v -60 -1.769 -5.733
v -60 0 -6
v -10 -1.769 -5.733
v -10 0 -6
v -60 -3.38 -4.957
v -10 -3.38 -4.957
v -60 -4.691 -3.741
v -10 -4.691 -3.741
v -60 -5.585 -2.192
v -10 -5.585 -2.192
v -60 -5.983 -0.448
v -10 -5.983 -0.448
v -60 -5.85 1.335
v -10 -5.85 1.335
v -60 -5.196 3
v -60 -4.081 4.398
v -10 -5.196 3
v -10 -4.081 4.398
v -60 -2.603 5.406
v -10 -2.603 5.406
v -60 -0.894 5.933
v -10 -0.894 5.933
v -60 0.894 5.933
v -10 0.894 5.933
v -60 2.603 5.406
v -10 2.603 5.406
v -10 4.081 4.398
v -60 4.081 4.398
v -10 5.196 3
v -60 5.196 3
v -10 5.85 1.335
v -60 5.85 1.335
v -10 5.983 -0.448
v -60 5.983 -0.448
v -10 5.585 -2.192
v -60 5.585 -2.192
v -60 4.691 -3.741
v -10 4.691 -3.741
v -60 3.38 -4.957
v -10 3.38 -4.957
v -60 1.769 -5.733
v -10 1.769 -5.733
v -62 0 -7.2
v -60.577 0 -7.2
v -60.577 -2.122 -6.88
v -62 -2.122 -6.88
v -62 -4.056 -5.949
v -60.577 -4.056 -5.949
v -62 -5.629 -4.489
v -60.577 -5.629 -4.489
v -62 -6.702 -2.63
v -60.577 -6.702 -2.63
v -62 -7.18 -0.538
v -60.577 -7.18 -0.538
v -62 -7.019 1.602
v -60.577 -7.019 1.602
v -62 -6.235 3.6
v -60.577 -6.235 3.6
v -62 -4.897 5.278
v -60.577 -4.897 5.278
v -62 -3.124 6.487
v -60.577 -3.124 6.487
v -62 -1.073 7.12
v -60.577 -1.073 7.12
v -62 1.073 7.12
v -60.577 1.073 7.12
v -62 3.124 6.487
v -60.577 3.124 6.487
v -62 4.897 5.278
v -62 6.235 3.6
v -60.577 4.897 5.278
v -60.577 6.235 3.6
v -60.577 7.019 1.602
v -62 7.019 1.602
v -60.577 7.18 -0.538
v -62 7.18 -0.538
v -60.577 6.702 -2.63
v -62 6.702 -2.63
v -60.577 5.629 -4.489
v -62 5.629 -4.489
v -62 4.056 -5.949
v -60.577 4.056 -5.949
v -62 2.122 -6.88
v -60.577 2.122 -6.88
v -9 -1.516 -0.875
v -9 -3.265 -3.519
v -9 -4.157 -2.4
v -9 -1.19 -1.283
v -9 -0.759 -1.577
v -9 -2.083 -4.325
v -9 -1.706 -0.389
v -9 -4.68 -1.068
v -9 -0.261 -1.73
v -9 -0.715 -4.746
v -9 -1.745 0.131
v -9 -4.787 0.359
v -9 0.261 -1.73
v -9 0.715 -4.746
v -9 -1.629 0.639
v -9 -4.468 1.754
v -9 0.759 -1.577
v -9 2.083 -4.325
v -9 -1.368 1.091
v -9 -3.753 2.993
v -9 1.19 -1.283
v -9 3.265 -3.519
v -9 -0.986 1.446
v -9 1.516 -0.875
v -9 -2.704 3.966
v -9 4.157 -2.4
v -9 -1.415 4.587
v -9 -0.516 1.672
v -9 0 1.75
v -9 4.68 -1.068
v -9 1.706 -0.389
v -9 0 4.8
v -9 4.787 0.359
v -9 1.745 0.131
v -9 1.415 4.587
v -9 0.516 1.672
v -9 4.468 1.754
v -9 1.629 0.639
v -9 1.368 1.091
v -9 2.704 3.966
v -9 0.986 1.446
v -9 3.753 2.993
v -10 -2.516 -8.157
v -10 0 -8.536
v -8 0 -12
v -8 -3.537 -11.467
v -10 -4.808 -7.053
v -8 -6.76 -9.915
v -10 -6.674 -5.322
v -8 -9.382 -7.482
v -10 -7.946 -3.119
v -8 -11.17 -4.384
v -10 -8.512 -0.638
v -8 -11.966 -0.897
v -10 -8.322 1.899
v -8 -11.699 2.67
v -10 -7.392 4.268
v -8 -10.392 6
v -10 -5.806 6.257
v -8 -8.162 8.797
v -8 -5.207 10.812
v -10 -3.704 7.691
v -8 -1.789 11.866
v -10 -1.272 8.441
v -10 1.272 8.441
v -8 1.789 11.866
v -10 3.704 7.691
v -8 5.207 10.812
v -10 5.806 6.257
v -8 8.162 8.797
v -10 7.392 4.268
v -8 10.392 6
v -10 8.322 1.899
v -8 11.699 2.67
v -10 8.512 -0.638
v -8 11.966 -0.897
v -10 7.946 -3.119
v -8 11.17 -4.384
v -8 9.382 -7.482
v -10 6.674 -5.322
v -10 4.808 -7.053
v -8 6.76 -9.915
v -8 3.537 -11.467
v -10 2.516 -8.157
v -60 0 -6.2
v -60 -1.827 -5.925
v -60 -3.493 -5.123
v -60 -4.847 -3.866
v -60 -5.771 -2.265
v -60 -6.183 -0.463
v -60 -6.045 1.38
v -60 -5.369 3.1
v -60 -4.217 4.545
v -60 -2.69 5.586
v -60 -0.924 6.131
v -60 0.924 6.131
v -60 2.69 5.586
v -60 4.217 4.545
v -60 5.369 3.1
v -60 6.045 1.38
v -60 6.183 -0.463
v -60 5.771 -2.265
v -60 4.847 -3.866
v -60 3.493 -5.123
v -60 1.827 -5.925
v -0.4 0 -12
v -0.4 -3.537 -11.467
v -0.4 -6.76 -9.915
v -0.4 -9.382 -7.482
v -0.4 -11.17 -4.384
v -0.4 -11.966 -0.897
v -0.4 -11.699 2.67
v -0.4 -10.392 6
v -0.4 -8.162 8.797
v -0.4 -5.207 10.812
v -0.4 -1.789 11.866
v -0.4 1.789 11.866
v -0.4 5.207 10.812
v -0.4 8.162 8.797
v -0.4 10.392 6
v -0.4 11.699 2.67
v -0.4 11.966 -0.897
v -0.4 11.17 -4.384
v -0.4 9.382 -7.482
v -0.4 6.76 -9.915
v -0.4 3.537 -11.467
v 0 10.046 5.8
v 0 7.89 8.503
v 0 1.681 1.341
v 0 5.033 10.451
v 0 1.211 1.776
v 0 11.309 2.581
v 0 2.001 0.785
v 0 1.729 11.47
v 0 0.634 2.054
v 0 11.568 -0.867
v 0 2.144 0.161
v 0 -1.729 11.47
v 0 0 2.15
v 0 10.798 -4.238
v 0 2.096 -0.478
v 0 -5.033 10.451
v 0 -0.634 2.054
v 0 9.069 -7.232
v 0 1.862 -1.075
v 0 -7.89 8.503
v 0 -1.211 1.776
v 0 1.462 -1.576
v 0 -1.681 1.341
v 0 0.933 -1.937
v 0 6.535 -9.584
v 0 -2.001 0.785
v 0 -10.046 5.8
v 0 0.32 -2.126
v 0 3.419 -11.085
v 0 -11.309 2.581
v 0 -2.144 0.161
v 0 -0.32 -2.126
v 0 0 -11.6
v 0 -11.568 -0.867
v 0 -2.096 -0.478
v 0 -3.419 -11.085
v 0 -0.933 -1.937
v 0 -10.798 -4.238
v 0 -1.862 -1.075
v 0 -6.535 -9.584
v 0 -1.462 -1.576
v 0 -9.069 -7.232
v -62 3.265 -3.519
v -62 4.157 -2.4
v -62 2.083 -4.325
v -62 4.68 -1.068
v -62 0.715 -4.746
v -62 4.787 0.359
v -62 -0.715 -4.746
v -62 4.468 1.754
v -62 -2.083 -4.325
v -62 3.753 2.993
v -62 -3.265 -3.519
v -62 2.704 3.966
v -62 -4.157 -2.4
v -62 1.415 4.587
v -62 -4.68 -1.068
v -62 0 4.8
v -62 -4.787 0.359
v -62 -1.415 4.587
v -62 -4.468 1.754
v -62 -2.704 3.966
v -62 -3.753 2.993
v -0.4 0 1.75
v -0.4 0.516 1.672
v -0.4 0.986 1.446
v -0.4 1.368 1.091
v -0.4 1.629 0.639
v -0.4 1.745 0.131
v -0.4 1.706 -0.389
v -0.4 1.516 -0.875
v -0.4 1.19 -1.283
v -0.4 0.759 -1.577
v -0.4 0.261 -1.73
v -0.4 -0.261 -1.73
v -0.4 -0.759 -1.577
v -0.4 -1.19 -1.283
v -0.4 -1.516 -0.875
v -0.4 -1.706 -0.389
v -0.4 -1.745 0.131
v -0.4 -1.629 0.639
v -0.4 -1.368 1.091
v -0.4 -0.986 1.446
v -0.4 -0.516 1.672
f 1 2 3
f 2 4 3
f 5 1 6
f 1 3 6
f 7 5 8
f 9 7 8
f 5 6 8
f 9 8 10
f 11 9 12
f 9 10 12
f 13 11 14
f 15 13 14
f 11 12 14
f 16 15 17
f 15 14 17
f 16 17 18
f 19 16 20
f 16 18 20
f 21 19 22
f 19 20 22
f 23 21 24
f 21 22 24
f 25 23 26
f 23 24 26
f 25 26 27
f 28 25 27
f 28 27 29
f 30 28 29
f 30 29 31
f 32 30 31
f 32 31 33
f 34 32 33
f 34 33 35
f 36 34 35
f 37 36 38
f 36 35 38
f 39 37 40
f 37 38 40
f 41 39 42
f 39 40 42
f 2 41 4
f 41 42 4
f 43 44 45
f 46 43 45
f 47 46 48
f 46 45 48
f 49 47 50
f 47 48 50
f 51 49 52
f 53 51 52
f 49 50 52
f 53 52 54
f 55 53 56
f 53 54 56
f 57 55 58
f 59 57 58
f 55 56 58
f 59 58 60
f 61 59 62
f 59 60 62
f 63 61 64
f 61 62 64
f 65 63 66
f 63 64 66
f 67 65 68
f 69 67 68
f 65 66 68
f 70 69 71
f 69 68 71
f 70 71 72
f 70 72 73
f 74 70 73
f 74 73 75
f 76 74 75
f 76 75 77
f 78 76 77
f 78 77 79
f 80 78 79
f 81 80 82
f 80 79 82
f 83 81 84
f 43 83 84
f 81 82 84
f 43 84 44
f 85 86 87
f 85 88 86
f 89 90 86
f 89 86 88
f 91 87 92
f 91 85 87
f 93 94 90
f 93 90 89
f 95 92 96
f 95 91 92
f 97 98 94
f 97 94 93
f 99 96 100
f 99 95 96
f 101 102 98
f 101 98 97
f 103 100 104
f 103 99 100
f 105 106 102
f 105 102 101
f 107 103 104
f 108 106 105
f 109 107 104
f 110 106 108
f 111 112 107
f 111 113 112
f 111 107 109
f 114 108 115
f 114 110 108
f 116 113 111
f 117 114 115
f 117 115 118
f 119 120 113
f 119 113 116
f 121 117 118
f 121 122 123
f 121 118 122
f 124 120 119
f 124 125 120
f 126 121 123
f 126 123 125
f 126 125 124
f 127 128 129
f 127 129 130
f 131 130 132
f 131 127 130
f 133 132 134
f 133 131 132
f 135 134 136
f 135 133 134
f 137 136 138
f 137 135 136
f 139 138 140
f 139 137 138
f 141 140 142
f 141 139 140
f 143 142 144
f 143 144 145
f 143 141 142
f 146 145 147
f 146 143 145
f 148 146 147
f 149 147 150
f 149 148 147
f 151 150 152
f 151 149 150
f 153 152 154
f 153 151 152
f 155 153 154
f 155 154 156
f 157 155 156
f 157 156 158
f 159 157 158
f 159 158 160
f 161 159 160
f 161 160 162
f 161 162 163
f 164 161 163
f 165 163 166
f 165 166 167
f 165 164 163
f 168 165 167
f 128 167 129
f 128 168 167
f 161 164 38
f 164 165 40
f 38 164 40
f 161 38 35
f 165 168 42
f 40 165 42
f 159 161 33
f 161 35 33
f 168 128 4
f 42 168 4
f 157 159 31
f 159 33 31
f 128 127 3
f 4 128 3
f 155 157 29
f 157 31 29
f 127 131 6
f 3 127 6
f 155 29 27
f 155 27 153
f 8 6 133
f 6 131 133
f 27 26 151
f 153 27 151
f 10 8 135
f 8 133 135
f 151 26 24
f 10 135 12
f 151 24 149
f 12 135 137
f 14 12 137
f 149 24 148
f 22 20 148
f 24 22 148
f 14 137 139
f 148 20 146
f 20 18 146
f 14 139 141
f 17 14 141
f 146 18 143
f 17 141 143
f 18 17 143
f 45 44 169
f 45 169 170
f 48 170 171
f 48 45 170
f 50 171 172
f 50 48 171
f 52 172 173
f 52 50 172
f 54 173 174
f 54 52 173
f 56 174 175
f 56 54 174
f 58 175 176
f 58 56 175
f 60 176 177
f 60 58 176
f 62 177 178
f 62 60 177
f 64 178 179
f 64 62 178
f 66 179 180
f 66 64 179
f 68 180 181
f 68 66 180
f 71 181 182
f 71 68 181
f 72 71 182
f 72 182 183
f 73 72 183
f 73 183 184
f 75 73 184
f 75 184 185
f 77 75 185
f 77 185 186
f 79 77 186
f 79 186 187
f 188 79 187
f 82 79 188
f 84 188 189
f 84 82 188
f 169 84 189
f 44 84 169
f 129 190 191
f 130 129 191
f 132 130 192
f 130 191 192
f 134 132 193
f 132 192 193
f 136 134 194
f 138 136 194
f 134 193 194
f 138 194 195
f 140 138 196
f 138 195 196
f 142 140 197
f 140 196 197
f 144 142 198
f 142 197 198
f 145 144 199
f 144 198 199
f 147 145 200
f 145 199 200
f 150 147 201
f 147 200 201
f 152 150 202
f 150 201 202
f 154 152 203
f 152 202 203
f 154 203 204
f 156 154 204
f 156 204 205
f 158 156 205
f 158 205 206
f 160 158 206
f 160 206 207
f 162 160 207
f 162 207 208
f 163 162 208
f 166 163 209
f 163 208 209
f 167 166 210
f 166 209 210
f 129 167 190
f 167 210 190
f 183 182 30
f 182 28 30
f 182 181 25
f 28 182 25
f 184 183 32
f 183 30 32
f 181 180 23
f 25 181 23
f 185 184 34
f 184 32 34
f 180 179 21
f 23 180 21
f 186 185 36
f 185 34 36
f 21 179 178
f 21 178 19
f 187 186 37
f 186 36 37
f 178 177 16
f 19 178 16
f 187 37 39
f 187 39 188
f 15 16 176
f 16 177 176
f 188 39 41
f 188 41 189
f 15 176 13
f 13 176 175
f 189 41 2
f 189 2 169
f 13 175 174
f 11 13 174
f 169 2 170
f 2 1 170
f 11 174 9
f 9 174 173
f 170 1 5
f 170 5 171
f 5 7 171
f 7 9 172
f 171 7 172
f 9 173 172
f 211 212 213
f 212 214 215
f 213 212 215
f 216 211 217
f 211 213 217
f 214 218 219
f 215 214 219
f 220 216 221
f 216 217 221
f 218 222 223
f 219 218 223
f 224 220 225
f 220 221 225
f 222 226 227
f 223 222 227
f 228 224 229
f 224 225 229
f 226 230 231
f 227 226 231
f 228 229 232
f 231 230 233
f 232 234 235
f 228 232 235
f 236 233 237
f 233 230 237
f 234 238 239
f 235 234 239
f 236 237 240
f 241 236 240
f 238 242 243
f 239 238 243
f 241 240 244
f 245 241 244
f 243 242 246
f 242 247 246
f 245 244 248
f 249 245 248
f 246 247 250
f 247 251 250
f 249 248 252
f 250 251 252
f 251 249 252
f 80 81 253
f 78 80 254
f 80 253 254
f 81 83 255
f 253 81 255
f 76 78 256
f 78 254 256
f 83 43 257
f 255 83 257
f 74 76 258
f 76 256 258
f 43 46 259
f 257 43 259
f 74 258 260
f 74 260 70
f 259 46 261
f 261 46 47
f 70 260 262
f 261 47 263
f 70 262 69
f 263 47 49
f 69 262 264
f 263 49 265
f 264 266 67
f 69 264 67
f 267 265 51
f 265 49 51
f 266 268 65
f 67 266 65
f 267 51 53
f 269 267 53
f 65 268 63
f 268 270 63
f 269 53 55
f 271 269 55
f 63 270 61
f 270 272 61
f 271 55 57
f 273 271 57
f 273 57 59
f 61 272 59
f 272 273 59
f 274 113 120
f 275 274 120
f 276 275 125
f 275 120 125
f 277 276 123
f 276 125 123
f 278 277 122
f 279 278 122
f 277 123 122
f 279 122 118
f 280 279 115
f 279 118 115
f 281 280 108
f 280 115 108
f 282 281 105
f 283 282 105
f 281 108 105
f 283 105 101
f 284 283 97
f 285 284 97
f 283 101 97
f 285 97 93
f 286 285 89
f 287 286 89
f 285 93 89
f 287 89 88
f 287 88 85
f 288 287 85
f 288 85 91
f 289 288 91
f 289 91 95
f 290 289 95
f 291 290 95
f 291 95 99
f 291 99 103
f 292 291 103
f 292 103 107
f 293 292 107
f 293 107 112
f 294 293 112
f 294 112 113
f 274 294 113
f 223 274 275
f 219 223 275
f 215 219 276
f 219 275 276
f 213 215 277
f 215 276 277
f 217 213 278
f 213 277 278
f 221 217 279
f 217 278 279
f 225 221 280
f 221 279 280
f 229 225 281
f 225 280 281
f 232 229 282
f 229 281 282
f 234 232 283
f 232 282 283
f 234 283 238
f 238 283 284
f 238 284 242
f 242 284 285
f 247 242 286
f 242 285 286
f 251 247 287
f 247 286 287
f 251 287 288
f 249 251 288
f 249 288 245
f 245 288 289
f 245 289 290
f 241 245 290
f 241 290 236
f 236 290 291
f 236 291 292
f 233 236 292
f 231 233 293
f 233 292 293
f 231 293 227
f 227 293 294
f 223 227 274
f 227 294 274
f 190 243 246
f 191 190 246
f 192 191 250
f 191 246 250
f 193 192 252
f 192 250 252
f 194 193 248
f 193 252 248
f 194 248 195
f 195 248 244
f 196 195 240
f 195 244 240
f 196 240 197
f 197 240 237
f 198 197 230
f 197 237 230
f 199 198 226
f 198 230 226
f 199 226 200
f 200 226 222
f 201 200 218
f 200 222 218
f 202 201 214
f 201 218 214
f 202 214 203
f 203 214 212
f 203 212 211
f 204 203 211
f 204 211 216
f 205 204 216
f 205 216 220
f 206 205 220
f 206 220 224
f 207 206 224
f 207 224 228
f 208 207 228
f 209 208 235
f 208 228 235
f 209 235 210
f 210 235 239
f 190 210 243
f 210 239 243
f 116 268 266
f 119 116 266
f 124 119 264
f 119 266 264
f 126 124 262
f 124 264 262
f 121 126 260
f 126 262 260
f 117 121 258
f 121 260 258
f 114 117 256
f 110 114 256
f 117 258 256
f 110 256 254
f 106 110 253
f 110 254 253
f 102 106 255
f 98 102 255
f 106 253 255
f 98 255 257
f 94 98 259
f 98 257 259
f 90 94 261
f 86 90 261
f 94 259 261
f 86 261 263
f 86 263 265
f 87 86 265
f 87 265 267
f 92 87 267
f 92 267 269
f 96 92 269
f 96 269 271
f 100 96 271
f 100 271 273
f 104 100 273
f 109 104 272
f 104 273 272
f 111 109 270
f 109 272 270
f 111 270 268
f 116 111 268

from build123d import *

# Parameters (mm, degrees)
CHAMFER1_SIZE      = 1
CHAMFER1_SIZE2     = 0.577350269
CHAMFER2_SIZE      = 2
CHAMFER2_SIZE2     = 3.464101615
SKETCH4_R          = 4.8
CUT_EXTRUDE1_DEPTH = 53
SKETCH5_R          = 1.75
CUT_EXTRUDE2_DEPTH = 10
CHAMFER3_SIZE      = 0.4


with BuildPart() as part:
    # Sketch3 → Revolve1 (revolve)
    with BuildSketch(Plane(origin=(0, 0, 0), x_dir=(1, 0, 0), z_dir=(0, 1, 0))):
        Polygon((-62, 0), (-62, 7.2), (-60, 7.2), (-60, 6), (-10, 6), (-10, 12), (0, 12), (0, 0), align=None)
    revolve(axis=Axis((0, 0, 0), (-1, 0, 0)))

    # Chamfer1
    chamfer1_edges = [part.edges().sort_by_distance(p)[0] for p in [
        (-60, 0, 7.2),
    ]]
    chamfer1_side = [part.faces().sort_by_distance(p)[0] for p in [
        (-60, 0, 6.996353247),
    ]]
    chamfer(chamfer1_edges, length=CHAMFER1_SIZE, length2=CHAMFER1_SIZE2, reference=chamfer1_side[0])

    # Chamfer2
    chamfer2_edges = [part.edges().sort_by_distance(p)[0] for p in [
        (-10, 0, 12),
    ]]
    chamfer2_side = [part.faces().sort_by_distance(p)[0] for p in [
        (-5, 0, 12),
    ]]
    chamfer(chamfer2_edges, length=CHAMFER2_SIZE, length2=CHAMFER2_SIZE2, reference=chamfer2_side[0])

    # Sketch4 → Cut-Extrude1 (cut)
    with BuildSketch(Plane.ZY.offset(62)):
        Circle(SKETCH4_R)
    extrude(amount=-CUT_EXTRUDE1_DEPTH, mode=Mode.SUBTRACT)

    # Sketch5 → Cut-Extrude2 (cut, through all)
    with BuildSketch(Plane.ZY.offset(9)):
        Circle(SKETCH5_R)
    extrude(amount=-CUT_EXTRUDE2_DEPTH, mode=Mode.SUBTRACT)

    # Chamfer3
    chamfer3_edges = [part.edges().sort_by_distance(p)[0] for p in [
        (0, 0, -1.75),
        (0, 0, 12),
    ]]
    chamfer(chamfer3_edges, length=CHAMFER3_SIZE)


solid = part.part
